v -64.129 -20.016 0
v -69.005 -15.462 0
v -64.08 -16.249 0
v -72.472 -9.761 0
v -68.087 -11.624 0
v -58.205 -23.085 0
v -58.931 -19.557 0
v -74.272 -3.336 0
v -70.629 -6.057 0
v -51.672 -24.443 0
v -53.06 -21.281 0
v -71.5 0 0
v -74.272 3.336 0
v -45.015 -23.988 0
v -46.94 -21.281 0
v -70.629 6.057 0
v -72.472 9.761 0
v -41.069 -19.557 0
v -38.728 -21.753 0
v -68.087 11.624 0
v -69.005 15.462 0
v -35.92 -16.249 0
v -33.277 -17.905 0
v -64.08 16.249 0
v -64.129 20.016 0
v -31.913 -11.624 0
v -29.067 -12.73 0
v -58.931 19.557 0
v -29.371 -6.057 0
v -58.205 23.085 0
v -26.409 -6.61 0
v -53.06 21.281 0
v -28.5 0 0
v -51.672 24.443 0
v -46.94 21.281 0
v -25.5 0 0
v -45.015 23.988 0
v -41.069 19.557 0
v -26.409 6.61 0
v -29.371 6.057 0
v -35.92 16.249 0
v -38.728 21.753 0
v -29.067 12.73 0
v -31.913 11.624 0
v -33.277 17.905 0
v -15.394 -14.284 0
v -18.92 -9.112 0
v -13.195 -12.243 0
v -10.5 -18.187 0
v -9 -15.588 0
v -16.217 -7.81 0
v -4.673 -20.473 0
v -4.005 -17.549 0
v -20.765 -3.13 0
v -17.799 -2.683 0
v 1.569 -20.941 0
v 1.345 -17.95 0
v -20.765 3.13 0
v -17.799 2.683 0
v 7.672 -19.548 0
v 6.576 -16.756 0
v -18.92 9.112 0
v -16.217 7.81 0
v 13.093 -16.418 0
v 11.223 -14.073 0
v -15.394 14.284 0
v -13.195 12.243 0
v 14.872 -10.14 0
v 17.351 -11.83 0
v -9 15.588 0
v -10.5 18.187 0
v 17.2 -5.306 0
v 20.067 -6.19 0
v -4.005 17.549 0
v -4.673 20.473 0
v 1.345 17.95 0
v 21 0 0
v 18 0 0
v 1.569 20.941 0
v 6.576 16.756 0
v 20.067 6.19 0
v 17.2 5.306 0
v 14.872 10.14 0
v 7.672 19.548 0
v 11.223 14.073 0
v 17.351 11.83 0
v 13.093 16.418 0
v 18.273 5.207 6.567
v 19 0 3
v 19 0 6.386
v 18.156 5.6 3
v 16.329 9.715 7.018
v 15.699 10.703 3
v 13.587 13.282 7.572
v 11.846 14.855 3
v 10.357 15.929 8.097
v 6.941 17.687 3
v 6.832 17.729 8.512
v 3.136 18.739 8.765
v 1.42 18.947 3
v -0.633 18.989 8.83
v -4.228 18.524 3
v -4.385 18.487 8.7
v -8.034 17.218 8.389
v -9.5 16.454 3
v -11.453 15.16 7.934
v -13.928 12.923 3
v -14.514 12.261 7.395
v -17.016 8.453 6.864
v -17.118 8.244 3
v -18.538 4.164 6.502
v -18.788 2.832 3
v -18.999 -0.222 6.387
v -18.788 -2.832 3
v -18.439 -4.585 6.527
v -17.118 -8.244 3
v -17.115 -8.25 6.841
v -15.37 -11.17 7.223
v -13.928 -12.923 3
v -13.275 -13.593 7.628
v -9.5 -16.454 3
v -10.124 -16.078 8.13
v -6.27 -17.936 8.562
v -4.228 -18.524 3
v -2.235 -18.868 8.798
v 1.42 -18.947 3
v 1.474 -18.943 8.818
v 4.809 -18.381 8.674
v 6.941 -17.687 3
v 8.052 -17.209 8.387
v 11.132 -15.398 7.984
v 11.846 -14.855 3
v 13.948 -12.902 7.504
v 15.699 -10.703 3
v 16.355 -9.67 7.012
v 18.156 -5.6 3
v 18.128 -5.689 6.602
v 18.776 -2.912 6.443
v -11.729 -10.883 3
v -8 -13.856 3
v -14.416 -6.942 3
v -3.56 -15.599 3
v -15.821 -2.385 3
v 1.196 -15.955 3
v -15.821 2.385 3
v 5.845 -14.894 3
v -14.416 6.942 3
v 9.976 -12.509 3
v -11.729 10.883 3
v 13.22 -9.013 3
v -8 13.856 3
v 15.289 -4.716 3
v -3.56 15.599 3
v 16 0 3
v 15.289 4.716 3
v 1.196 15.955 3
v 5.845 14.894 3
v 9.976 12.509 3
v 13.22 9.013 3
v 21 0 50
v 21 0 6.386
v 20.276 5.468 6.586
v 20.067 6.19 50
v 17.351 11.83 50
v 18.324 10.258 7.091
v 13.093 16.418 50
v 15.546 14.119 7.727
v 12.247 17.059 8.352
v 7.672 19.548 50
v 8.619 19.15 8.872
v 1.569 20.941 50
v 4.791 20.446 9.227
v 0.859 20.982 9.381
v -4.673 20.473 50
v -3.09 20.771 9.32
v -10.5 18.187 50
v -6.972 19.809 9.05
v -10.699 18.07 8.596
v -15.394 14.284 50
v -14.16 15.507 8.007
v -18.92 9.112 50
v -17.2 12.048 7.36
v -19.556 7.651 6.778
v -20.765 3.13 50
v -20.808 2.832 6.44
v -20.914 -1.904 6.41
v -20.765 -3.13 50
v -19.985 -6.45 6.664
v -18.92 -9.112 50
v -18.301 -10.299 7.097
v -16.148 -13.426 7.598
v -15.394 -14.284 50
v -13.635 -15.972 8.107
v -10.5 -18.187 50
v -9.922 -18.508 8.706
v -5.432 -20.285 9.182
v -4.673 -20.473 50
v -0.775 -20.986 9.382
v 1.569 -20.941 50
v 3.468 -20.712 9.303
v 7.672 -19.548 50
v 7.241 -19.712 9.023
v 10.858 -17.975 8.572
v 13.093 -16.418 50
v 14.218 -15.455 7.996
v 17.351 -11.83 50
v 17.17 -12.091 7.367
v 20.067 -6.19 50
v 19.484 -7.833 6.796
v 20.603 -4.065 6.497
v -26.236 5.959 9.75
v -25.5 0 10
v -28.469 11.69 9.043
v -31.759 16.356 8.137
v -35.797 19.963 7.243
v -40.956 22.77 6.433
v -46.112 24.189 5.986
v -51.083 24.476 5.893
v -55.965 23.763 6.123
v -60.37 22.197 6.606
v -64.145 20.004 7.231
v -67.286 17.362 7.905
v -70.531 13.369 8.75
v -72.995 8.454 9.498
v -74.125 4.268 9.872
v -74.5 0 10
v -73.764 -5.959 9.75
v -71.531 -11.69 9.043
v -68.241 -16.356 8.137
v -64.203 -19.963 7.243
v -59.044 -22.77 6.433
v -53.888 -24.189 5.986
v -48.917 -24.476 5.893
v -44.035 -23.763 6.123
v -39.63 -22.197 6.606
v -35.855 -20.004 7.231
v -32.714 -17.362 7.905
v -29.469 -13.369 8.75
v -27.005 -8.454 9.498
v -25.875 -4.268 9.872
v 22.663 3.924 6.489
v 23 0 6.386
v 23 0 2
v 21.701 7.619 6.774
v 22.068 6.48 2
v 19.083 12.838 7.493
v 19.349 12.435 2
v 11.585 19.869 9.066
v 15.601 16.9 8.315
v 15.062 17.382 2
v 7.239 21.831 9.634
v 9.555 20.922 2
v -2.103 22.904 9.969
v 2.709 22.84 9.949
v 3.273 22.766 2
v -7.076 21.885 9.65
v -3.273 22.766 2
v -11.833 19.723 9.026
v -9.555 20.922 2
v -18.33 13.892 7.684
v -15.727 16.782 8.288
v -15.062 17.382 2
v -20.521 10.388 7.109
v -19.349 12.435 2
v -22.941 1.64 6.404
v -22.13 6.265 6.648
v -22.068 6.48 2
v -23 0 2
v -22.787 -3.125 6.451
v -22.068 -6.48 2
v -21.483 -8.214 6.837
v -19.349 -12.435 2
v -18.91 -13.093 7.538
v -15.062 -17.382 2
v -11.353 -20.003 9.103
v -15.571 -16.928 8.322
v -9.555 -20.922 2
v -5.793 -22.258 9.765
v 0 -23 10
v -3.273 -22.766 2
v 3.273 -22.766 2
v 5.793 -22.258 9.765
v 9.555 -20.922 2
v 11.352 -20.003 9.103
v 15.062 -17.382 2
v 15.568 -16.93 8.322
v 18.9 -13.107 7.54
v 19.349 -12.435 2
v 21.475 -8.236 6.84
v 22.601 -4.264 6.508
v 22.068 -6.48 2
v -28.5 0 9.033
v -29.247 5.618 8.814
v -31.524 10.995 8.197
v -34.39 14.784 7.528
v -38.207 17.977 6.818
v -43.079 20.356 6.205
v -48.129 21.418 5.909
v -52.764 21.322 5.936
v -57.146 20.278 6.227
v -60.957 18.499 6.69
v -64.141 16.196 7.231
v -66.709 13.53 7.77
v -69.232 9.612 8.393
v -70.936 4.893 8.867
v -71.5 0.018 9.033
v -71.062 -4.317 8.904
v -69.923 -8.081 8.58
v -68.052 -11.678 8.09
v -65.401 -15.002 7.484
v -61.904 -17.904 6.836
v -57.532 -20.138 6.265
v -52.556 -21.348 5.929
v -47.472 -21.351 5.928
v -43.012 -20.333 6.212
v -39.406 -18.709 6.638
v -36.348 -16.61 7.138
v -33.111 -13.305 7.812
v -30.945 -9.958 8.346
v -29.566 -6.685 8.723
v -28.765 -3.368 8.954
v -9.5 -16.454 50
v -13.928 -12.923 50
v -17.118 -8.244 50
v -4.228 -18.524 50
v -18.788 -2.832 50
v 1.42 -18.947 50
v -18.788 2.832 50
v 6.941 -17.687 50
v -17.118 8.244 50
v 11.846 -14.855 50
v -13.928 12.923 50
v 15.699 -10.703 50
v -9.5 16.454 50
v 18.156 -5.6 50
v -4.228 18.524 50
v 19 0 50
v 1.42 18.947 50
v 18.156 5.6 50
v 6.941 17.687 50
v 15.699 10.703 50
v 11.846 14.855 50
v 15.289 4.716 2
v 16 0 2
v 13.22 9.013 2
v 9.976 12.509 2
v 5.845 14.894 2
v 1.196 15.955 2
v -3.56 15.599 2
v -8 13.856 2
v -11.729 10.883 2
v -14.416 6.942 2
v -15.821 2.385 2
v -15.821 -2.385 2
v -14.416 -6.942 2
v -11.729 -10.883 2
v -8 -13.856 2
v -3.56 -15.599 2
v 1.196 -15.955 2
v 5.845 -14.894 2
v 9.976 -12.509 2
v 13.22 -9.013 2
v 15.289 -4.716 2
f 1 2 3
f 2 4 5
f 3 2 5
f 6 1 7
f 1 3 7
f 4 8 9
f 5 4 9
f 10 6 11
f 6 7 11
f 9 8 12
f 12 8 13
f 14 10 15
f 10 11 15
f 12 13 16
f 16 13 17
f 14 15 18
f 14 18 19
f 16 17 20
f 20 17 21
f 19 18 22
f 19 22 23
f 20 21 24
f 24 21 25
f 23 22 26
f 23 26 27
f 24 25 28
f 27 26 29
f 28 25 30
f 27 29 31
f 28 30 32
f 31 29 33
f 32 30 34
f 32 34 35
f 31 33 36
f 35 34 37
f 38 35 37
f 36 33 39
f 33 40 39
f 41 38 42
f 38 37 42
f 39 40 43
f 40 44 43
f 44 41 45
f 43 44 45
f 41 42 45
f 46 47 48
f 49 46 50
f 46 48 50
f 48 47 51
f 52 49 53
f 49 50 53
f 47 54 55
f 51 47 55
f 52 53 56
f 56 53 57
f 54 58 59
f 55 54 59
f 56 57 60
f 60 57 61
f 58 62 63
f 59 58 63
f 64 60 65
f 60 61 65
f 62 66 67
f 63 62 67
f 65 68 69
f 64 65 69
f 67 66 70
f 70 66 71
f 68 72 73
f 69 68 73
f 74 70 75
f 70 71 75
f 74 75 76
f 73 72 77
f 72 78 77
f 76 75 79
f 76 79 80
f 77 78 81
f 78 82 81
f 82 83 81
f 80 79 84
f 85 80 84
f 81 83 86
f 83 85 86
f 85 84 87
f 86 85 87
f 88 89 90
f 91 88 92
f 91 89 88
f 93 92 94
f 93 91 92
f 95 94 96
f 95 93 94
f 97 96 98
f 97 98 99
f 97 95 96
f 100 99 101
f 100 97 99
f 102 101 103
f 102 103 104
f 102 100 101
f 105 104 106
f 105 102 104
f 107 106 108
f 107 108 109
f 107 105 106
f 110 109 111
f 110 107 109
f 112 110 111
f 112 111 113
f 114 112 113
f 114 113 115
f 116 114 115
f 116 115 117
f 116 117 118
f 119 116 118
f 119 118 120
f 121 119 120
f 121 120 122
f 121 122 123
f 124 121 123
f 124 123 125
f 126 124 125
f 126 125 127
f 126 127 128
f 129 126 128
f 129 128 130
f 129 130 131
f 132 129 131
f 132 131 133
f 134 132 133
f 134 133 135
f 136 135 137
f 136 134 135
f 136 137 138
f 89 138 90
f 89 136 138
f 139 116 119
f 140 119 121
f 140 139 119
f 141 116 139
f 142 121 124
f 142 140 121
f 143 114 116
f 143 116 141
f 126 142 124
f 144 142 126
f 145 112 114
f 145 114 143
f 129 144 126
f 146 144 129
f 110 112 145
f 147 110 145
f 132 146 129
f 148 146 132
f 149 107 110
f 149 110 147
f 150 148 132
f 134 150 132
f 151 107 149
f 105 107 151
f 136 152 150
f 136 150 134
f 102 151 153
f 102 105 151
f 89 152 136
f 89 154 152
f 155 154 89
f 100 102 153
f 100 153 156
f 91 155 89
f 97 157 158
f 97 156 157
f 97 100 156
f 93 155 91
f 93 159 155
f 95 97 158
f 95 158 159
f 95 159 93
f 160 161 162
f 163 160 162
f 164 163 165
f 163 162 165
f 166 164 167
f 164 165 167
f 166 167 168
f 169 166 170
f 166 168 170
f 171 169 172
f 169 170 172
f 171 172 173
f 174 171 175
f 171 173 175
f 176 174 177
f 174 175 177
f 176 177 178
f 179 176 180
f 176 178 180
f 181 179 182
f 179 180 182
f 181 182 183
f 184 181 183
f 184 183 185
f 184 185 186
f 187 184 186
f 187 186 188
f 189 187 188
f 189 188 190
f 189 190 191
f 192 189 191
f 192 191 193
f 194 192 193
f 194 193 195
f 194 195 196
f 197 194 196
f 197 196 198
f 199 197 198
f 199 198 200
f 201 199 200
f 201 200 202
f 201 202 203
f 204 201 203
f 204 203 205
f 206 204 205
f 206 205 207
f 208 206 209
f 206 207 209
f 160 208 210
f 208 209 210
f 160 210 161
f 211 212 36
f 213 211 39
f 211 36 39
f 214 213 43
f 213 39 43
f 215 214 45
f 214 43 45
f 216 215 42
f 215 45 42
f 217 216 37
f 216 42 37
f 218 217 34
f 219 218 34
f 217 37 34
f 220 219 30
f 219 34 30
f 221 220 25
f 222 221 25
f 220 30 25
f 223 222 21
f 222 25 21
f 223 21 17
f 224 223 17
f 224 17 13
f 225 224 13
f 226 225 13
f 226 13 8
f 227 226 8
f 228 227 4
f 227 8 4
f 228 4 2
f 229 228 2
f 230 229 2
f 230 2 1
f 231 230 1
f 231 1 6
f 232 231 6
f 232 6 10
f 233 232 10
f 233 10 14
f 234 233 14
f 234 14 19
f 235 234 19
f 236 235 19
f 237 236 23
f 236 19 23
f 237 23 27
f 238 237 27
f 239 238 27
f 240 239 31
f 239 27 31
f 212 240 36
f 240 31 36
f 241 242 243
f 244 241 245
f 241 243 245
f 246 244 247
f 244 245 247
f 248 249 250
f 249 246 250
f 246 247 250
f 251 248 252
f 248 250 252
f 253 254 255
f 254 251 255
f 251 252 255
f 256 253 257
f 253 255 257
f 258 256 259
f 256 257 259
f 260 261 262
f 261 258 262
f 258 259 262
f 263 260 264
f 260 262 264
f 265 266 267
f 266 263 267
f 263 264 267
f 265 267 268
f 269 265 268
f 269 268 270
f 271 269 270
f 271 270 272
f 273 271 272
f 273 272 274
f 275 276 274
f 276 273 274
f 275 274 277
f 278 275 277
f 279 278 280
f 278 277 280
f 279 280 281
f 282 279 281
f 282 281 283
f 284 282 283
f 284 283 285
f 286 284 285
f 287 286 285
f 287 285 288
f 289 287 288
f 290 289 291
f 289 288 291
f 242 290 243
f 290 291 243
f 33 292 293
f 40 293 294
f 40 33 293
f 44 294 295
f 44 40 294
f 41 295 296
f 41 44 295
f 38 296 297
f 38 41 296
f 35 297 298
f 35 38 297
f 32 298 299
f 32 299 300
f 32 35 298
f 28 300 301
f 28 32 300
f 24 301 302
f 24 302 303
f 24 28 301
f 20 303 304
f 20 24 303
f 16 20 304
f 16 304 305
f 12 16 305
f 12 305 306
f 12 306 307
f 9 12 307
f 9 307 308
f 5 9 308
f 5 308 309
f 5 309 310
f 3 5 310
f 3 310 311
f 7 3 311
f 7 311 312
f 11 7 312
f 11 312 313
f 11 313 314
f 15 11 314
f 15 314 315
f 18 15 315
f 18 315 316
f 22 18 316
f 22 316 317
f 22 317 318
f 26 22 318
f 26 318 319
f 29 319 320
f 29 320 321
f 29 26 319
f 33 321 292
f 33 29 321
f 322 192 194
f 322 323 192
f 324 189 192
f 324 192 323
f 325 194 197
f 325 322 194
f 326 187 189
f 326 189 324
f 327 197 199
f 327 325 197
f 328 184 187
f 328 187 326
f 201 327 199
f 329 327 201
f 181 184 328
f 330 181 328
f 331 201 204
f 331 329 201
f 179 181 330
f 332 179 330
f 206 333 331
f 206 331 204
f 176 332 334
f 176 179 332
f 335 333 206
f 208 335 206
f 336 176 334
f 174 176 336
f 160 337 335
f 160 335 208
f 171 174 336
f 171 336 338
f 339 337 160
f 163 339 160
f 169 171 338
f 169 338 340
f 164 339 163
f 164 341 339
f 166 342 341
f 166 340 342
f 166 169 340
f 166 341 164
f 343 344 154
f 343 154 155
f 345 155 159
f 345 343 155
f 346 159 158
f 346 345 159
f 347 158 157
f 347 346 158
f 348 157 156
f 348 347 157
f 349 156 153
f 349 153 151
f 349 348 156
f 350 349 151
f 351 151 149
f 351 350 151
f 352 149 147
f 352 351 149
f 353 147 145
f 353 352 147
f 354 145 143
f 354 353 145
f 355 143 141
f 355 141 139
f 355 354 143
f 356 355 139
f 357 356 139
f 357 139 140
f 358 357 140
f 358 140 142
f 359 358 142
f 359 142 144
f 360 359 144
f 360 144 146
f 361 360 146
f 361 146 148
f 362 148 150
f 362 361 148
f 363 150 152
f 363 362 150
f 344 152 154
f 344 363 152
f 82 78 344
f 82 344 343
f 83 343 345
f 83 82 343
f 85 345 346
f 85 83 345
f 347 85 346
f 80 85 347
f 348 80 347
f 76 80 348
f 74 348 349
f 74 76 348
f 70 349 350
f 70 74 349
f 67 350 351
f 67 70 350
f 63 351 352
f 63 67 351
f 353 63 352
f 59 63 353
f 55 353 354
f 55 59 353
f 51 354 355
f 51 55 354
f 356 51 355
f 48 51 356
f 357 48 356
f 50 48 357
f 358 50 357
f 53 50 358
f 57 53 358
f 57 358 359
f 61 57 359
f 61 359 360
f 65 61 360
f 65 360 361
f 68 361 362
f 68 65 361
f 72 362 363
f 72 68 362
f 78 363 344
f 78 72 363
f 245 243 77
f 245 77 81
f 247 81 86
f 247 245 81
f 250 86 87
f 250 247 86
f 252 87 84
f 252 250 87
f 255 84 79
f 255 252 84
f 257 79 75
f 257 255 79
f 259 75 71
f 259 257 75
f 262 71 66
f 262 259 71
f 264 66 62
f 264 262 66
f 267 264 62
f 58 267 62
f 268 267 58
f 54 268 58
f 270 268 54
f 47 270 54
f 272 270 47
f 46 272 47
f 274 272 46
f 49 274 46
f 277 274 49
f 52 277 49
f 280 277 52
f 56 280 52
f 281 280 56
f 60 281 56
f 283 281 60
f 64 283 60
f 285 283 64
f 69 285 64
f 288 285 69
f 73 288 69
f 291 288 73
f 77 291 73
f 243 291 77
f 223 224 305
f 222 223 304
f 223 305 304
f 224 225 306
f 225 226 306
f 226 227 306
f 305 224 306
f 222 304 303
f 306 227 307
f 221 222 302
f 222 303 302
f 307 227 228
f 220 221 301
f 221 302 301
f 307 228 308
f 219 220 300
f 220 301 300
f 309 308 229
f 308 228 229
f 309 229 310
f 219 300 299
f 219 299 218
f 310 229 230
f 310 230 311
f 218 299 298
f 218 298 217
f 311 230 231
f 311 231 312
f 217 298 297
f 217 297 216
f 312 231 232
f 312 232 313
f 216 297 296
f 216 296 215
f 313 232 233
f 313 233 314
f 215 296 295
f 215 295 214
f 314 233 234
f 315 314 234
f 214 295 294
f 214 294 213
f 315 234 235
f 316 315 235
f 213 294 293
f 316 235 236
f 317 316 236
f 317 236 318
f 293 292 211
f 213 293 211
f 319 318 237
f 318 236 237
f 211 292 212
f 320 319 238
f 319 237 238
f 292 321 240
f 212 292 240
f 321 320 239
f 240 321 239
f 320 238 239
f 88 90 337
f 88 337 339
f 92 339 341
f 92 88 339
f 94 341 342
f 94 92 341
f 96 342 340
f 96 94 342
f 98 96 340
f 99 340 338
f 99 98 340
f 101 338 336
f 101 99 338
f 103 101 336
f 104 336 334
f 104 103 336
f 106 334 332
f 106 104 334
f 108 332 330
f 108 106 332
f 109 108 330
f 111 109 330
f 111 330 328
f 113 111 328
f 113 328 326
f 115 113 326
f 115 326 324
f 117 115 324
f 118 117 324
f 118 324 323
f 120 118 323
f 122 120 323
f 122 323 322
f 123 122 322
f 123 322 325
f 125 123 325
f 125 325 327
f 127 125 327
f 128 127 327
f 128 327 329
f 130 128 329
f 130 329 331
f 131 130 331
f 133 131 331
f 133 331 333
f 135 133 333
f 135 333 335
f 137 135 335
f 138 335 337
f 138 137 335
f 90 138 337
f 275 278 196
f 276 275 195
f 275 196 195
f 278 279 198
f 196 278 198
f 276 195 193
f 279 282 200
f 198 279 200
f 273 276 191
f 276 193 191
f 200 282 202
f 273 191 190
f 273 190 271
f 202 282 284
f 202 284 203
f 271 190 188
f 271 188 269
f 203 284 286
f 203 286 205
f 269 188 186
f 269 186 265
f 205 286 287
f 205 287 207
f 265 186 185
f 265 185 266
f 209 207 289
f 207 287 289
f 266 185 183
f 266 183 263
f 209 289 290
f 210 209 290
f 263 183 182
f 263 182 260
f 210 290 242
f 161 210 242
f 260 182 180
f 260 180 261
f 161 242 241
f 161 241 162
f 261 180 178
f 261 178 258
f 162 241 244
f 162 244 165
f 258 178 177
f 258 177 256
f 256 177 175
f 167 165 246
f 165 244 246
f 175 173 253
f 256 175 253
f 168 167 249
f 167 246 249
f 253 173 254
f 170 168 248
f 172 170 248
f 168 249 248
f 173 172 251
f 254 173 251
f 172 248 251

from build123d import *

# Parameters (mm, degrees)
F0_R      = 23
F0_R_2    = 16
F1_DEPTH  = 3
F2_R      = 23
F2_R_2    = 19
F3_DEPTH  = 25
F5_DEPTH  = 50
F6_R      = 21
F6_R_2    = 19
F7_DEPTH  = 50
F8_R      = 24.5
F8_R_2    = 21.5
F9_DEPTH  = 25
F11_DEPTH = 50
F12_SIZE  = 2


with BuildPart() as f1:
    # F0 (on Top) → F1 (new body)
    with BuildSketch(Plane.XY):
        Circle(F0_R)
        Circle(F0_R_2, mode=Mode.SUBTRACT)
    extrude(amount=F1_DEPTH)

    # F2 (on face) → F3 (join)
    with BuildSketch(Plane.XY.offset(3)):
        Circle(F2_R)
        Circle(F2_R_2, mode=Mode.SUBTRACT)
    extrude(amount=F3_DEPTH)

    # F4 (on Right) → F5 (cut, symmetric)
    with BuildSketch(Plane.YZ):
        with BuildLine():
            Line((-32.46776, 33.882733), (-23, 10))
            ThreePointArc((-23, 10), (0, 6.386273), (23, 10))
            Line((23, 10), (36.376942, 33.882733))
            Line((36.376942, 33.882733), (-32.46776, 33.882733))
        make_face()
    extrude(amount=F5_DEPTH, both=True, mode=Mode.SUBTRACT)

    # F6 (on Top) → F7 (join)
    with BuildSketch(Plane.XY):
        Circle(F6_R)
        Circle(F6_R_2, mode=Mode.SUBTRACT)
    extrude(amount=F7_DEPTH)

    # F12
    f12_edges = [f1.edges().sort_by_distance(p)[0] for p in [
        (-23, 0, 0),
        (-16, 0, 0),
    ]]
    chamfer(f12_edges, length=F12_SIZE)


with BuildPart() as f9:
    # F8 (on Top) → F9 (new body)
    with BuildSketch(Plane.XY):
        with Locations((-50, 0)):
            Circle(F8_R)
        with Locations((-50, 0)):
            Circle(F8_R_2, mode=Mode.SUBTRACT)
    extrude(amount=F9_DEPTH)

    # F10 (on Front) → F11 (cut, symmetric)
    with BuildSketch(Plane.XZ):
        with BuildLine():
            Line((-81.317961, 36.653891), (-74.5, 10))
            ThreePointArc((-74.5, 10), (-50, 5.885471), (-25.5, 10))
            Line((-25.5, 10), (-22.981653, 35.573591))
            Line((-22.981653, 35.573591), (-81.317961, 36.653891))
        make_face()
    extrude(amount=F11_DEPTH, both=True, mode=Mode.SUBTRACT)


solid = Compound([f1.part, f9.part])
